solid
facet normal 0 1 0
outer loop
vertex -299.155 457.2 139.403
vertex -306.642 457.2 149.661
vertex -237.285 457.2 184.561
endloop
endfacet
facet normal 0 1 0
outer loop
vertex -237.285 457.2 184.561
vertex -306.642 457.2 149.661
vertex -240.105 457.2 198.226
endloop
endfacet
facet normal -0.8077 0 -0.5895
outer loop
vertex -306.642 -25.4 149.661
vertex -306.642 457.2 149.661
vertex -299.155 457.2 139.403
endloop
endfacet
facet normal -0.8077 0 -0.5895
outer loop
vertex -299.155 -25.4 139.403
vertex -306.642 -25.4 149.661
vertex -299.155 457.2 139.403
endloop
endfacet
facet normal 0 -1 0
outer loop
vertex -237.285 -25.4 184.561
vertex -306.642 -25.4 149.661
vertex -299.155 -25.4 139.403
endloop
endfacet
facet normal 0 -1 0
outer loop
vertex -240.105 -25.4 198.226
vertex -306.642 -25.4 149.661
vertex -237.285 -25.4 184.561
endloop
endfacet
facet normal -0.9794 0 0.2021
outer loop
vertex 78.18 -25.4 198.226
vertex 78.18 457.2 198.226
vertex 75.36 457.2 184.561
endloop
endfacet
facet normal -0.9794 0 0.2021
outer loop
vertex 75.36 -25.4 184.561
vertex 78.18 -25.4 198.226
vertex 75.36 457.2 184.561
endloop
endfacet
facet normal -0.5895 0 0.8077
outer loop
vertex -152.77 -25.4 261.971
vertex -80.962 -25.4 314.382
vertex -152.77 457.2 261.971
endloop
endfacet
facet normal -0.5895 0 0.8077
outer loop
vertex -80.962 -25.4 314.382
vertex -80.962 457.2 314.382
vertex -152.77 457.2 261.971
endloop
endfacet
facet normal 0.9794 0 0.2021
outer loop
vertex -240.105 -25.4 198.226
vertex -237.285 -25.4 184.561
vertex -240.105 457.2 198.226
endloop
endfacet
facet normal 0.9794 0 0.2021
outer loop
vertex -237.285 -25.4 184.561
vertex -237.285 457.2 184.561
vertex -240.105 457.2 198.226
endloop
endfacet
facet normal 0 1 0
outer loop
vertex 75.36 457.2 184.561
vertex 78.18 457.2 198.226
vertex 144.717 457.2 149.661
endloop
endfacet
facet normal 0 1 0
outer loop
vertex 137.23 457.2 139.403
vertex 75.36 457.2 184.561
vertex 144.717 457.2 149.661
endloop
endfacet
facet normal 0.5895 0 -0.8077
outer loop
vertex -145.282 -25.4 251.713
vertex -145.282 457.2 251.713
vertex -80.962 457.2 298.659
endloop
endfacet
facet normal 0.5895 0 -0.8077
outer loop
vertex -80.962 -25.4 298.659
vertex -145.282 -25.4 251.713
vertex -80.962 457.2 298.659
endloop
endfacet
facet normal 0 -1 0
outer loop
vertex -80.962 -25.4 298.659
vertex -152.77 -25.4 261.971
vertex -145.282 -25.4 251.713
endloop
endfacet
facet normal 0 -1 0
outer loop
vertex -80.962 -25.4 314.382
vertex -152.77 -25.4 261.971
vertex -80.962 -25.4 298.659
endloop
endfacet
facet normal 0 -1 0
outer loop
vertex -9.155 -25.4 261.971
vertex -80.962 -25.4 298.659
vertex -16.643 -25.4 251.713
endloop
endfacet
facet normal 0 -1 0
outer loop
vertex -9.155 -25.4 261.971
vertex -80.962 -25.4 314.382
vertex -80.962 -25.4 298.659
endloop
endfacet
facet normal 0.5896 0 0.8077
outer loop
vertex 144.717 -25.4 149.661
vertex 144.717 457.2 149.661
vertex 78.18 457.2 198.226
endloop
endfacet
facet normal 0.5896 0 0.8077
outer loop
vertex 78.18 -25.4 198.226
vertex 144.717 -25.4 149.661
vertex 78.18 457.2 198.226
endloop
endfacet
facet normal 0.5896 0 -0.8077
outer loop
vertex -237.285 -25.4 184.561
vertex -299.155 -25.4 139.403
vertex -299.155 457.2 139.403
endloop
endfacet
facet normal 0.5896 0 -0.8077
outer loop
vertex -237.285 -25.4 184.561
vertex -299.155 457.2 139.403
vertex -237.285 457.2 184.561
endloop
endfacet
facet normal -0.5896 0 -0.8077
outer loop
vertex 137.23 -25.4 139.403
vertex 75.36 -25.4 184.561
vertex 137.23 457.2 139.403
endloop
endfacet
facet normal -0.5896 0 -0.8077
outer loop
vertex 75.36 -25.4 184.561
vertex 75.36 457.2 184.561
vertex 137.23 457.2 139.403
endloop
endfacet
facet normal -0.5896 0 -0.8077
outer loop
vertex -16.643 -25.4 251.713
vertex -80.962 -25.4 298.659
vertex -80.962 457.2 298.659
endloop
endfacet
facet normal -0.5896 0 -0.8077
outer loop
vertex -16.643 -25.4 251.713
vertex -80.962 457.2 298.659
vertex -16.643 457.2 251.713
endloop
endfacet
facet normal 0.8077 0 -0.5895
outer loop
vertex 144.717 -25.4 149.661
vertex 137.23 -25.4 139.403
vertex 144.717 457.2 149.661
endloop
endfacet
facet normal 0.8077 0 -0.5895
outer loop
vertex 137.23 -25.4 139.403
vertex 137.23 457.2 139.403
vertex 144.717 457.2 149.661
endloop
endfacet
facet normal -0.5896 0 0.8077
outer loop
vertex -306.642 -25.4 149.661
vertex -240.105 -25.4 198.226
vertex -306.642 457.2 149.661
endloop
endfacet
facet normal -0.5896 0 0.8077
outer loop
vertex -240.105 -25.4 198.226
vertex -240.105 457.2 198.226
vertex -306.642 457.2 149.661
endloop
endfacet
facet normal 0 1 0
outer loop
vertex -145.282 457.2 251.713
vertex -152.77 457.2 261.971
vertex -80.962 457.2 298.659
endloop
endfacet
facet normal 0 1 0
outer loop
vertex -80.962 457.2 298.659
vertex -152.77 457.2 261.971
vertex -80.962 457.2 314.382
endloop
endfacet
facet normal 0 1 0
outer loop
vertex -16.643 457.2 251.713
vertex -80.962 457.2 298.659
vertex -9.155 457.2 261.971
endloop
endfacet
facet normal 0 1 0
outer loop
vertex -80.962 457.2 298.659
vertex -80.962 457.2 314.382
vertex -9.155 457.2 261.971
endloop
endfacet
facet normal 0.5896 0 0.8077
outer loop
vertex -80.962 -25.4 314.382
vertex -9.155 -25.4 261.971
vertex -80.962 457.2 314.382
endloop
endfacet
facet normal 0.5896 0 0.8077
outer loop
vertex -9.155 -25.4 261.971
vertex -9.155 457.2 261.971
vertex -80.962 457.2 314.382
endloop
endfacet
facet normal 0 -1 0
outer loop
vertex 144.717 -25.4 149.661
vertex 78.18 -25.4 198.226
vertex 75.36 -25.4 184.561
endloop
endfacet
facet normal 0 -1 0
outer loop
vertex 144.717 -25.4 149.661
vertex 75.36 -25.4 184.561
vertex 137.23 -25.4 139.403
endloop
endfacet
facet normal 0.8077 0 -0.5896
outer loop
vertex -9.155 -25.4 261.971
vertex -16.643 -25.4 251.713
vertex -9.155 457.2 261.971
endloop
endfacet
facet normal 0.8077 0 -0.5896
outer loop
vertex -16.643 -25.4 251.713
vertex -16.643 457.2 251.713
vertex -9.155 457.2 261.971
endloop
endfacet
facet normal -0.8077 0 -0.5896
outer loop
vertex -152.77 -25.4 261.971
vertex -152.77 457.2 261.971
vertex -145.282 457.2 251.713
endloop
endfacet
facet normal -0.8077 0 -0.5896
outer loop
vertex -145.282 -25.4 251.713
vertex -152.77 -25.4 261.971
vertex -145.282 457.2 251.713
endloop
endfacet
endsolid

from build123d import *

# Parameters (mm, degrees)
F1_DEPTH      = 457.2
F1_DEPTH_BACK = 25.4


with BuildPart() as f1:
    # F0 (on Front) → F1 (new body, two sides)
    with BuildSketch(Plane.XZ) as f1_sk:
        Polygon((-299.1548351821, 139.4029458545), (-237.2849558077, 184.5610987857), (-240.105147751, 198.2257542497), (-306.6421593668, 149.6611121894), align=None)
    extrude(amount=-F1_DEPTH)
    extrude(f1_sk.sketch, amount=F1_DEPTH_BACK)


with BuildPart() as f1b:
    # F0 (on Front) → F1, piece 2 (new body, two sides)
    with BuildSketch(Plane.XZ) as f1_2_sk:
        Polygon((-80.9625, 298.6591613216), (-16.6426598407, 251.7128086247), (-9.155335656, 261.9709749596), (-80.9625, 314.3822442523), align=None)
        Polygon((-145.2823401593, 251.7128086247), (-80.9625, 298.6591613216), (-80.9625, 314.3822442523), (-152.769664344, 261.9709749596), align=None)
    extrude(amount=-F1_DEPTH)
    extrude(f1_2_sk.sketch, amount=F1_DEPTH_BACK)


with BuildPart() as f1c:
    # F0 (on Front) → F1, piece 3 (new body, two sides)
    with BuildSketch(Plane.XZ) as f1_3_sk:
        Polygon((78.180147751, 198.2257542497), (75.3599558077, 184.5610987857), (137.2298351821, 139.4029458545), (144.7171593668, 149.6611121894), align=None)
    extrude(amount=-F1_DEPTH)
    extrude(f1_3_sk.sketch, amount=F1_DEPTH_BACK)


solid = Compound([f1.part, f1b.part, f1c.part])
